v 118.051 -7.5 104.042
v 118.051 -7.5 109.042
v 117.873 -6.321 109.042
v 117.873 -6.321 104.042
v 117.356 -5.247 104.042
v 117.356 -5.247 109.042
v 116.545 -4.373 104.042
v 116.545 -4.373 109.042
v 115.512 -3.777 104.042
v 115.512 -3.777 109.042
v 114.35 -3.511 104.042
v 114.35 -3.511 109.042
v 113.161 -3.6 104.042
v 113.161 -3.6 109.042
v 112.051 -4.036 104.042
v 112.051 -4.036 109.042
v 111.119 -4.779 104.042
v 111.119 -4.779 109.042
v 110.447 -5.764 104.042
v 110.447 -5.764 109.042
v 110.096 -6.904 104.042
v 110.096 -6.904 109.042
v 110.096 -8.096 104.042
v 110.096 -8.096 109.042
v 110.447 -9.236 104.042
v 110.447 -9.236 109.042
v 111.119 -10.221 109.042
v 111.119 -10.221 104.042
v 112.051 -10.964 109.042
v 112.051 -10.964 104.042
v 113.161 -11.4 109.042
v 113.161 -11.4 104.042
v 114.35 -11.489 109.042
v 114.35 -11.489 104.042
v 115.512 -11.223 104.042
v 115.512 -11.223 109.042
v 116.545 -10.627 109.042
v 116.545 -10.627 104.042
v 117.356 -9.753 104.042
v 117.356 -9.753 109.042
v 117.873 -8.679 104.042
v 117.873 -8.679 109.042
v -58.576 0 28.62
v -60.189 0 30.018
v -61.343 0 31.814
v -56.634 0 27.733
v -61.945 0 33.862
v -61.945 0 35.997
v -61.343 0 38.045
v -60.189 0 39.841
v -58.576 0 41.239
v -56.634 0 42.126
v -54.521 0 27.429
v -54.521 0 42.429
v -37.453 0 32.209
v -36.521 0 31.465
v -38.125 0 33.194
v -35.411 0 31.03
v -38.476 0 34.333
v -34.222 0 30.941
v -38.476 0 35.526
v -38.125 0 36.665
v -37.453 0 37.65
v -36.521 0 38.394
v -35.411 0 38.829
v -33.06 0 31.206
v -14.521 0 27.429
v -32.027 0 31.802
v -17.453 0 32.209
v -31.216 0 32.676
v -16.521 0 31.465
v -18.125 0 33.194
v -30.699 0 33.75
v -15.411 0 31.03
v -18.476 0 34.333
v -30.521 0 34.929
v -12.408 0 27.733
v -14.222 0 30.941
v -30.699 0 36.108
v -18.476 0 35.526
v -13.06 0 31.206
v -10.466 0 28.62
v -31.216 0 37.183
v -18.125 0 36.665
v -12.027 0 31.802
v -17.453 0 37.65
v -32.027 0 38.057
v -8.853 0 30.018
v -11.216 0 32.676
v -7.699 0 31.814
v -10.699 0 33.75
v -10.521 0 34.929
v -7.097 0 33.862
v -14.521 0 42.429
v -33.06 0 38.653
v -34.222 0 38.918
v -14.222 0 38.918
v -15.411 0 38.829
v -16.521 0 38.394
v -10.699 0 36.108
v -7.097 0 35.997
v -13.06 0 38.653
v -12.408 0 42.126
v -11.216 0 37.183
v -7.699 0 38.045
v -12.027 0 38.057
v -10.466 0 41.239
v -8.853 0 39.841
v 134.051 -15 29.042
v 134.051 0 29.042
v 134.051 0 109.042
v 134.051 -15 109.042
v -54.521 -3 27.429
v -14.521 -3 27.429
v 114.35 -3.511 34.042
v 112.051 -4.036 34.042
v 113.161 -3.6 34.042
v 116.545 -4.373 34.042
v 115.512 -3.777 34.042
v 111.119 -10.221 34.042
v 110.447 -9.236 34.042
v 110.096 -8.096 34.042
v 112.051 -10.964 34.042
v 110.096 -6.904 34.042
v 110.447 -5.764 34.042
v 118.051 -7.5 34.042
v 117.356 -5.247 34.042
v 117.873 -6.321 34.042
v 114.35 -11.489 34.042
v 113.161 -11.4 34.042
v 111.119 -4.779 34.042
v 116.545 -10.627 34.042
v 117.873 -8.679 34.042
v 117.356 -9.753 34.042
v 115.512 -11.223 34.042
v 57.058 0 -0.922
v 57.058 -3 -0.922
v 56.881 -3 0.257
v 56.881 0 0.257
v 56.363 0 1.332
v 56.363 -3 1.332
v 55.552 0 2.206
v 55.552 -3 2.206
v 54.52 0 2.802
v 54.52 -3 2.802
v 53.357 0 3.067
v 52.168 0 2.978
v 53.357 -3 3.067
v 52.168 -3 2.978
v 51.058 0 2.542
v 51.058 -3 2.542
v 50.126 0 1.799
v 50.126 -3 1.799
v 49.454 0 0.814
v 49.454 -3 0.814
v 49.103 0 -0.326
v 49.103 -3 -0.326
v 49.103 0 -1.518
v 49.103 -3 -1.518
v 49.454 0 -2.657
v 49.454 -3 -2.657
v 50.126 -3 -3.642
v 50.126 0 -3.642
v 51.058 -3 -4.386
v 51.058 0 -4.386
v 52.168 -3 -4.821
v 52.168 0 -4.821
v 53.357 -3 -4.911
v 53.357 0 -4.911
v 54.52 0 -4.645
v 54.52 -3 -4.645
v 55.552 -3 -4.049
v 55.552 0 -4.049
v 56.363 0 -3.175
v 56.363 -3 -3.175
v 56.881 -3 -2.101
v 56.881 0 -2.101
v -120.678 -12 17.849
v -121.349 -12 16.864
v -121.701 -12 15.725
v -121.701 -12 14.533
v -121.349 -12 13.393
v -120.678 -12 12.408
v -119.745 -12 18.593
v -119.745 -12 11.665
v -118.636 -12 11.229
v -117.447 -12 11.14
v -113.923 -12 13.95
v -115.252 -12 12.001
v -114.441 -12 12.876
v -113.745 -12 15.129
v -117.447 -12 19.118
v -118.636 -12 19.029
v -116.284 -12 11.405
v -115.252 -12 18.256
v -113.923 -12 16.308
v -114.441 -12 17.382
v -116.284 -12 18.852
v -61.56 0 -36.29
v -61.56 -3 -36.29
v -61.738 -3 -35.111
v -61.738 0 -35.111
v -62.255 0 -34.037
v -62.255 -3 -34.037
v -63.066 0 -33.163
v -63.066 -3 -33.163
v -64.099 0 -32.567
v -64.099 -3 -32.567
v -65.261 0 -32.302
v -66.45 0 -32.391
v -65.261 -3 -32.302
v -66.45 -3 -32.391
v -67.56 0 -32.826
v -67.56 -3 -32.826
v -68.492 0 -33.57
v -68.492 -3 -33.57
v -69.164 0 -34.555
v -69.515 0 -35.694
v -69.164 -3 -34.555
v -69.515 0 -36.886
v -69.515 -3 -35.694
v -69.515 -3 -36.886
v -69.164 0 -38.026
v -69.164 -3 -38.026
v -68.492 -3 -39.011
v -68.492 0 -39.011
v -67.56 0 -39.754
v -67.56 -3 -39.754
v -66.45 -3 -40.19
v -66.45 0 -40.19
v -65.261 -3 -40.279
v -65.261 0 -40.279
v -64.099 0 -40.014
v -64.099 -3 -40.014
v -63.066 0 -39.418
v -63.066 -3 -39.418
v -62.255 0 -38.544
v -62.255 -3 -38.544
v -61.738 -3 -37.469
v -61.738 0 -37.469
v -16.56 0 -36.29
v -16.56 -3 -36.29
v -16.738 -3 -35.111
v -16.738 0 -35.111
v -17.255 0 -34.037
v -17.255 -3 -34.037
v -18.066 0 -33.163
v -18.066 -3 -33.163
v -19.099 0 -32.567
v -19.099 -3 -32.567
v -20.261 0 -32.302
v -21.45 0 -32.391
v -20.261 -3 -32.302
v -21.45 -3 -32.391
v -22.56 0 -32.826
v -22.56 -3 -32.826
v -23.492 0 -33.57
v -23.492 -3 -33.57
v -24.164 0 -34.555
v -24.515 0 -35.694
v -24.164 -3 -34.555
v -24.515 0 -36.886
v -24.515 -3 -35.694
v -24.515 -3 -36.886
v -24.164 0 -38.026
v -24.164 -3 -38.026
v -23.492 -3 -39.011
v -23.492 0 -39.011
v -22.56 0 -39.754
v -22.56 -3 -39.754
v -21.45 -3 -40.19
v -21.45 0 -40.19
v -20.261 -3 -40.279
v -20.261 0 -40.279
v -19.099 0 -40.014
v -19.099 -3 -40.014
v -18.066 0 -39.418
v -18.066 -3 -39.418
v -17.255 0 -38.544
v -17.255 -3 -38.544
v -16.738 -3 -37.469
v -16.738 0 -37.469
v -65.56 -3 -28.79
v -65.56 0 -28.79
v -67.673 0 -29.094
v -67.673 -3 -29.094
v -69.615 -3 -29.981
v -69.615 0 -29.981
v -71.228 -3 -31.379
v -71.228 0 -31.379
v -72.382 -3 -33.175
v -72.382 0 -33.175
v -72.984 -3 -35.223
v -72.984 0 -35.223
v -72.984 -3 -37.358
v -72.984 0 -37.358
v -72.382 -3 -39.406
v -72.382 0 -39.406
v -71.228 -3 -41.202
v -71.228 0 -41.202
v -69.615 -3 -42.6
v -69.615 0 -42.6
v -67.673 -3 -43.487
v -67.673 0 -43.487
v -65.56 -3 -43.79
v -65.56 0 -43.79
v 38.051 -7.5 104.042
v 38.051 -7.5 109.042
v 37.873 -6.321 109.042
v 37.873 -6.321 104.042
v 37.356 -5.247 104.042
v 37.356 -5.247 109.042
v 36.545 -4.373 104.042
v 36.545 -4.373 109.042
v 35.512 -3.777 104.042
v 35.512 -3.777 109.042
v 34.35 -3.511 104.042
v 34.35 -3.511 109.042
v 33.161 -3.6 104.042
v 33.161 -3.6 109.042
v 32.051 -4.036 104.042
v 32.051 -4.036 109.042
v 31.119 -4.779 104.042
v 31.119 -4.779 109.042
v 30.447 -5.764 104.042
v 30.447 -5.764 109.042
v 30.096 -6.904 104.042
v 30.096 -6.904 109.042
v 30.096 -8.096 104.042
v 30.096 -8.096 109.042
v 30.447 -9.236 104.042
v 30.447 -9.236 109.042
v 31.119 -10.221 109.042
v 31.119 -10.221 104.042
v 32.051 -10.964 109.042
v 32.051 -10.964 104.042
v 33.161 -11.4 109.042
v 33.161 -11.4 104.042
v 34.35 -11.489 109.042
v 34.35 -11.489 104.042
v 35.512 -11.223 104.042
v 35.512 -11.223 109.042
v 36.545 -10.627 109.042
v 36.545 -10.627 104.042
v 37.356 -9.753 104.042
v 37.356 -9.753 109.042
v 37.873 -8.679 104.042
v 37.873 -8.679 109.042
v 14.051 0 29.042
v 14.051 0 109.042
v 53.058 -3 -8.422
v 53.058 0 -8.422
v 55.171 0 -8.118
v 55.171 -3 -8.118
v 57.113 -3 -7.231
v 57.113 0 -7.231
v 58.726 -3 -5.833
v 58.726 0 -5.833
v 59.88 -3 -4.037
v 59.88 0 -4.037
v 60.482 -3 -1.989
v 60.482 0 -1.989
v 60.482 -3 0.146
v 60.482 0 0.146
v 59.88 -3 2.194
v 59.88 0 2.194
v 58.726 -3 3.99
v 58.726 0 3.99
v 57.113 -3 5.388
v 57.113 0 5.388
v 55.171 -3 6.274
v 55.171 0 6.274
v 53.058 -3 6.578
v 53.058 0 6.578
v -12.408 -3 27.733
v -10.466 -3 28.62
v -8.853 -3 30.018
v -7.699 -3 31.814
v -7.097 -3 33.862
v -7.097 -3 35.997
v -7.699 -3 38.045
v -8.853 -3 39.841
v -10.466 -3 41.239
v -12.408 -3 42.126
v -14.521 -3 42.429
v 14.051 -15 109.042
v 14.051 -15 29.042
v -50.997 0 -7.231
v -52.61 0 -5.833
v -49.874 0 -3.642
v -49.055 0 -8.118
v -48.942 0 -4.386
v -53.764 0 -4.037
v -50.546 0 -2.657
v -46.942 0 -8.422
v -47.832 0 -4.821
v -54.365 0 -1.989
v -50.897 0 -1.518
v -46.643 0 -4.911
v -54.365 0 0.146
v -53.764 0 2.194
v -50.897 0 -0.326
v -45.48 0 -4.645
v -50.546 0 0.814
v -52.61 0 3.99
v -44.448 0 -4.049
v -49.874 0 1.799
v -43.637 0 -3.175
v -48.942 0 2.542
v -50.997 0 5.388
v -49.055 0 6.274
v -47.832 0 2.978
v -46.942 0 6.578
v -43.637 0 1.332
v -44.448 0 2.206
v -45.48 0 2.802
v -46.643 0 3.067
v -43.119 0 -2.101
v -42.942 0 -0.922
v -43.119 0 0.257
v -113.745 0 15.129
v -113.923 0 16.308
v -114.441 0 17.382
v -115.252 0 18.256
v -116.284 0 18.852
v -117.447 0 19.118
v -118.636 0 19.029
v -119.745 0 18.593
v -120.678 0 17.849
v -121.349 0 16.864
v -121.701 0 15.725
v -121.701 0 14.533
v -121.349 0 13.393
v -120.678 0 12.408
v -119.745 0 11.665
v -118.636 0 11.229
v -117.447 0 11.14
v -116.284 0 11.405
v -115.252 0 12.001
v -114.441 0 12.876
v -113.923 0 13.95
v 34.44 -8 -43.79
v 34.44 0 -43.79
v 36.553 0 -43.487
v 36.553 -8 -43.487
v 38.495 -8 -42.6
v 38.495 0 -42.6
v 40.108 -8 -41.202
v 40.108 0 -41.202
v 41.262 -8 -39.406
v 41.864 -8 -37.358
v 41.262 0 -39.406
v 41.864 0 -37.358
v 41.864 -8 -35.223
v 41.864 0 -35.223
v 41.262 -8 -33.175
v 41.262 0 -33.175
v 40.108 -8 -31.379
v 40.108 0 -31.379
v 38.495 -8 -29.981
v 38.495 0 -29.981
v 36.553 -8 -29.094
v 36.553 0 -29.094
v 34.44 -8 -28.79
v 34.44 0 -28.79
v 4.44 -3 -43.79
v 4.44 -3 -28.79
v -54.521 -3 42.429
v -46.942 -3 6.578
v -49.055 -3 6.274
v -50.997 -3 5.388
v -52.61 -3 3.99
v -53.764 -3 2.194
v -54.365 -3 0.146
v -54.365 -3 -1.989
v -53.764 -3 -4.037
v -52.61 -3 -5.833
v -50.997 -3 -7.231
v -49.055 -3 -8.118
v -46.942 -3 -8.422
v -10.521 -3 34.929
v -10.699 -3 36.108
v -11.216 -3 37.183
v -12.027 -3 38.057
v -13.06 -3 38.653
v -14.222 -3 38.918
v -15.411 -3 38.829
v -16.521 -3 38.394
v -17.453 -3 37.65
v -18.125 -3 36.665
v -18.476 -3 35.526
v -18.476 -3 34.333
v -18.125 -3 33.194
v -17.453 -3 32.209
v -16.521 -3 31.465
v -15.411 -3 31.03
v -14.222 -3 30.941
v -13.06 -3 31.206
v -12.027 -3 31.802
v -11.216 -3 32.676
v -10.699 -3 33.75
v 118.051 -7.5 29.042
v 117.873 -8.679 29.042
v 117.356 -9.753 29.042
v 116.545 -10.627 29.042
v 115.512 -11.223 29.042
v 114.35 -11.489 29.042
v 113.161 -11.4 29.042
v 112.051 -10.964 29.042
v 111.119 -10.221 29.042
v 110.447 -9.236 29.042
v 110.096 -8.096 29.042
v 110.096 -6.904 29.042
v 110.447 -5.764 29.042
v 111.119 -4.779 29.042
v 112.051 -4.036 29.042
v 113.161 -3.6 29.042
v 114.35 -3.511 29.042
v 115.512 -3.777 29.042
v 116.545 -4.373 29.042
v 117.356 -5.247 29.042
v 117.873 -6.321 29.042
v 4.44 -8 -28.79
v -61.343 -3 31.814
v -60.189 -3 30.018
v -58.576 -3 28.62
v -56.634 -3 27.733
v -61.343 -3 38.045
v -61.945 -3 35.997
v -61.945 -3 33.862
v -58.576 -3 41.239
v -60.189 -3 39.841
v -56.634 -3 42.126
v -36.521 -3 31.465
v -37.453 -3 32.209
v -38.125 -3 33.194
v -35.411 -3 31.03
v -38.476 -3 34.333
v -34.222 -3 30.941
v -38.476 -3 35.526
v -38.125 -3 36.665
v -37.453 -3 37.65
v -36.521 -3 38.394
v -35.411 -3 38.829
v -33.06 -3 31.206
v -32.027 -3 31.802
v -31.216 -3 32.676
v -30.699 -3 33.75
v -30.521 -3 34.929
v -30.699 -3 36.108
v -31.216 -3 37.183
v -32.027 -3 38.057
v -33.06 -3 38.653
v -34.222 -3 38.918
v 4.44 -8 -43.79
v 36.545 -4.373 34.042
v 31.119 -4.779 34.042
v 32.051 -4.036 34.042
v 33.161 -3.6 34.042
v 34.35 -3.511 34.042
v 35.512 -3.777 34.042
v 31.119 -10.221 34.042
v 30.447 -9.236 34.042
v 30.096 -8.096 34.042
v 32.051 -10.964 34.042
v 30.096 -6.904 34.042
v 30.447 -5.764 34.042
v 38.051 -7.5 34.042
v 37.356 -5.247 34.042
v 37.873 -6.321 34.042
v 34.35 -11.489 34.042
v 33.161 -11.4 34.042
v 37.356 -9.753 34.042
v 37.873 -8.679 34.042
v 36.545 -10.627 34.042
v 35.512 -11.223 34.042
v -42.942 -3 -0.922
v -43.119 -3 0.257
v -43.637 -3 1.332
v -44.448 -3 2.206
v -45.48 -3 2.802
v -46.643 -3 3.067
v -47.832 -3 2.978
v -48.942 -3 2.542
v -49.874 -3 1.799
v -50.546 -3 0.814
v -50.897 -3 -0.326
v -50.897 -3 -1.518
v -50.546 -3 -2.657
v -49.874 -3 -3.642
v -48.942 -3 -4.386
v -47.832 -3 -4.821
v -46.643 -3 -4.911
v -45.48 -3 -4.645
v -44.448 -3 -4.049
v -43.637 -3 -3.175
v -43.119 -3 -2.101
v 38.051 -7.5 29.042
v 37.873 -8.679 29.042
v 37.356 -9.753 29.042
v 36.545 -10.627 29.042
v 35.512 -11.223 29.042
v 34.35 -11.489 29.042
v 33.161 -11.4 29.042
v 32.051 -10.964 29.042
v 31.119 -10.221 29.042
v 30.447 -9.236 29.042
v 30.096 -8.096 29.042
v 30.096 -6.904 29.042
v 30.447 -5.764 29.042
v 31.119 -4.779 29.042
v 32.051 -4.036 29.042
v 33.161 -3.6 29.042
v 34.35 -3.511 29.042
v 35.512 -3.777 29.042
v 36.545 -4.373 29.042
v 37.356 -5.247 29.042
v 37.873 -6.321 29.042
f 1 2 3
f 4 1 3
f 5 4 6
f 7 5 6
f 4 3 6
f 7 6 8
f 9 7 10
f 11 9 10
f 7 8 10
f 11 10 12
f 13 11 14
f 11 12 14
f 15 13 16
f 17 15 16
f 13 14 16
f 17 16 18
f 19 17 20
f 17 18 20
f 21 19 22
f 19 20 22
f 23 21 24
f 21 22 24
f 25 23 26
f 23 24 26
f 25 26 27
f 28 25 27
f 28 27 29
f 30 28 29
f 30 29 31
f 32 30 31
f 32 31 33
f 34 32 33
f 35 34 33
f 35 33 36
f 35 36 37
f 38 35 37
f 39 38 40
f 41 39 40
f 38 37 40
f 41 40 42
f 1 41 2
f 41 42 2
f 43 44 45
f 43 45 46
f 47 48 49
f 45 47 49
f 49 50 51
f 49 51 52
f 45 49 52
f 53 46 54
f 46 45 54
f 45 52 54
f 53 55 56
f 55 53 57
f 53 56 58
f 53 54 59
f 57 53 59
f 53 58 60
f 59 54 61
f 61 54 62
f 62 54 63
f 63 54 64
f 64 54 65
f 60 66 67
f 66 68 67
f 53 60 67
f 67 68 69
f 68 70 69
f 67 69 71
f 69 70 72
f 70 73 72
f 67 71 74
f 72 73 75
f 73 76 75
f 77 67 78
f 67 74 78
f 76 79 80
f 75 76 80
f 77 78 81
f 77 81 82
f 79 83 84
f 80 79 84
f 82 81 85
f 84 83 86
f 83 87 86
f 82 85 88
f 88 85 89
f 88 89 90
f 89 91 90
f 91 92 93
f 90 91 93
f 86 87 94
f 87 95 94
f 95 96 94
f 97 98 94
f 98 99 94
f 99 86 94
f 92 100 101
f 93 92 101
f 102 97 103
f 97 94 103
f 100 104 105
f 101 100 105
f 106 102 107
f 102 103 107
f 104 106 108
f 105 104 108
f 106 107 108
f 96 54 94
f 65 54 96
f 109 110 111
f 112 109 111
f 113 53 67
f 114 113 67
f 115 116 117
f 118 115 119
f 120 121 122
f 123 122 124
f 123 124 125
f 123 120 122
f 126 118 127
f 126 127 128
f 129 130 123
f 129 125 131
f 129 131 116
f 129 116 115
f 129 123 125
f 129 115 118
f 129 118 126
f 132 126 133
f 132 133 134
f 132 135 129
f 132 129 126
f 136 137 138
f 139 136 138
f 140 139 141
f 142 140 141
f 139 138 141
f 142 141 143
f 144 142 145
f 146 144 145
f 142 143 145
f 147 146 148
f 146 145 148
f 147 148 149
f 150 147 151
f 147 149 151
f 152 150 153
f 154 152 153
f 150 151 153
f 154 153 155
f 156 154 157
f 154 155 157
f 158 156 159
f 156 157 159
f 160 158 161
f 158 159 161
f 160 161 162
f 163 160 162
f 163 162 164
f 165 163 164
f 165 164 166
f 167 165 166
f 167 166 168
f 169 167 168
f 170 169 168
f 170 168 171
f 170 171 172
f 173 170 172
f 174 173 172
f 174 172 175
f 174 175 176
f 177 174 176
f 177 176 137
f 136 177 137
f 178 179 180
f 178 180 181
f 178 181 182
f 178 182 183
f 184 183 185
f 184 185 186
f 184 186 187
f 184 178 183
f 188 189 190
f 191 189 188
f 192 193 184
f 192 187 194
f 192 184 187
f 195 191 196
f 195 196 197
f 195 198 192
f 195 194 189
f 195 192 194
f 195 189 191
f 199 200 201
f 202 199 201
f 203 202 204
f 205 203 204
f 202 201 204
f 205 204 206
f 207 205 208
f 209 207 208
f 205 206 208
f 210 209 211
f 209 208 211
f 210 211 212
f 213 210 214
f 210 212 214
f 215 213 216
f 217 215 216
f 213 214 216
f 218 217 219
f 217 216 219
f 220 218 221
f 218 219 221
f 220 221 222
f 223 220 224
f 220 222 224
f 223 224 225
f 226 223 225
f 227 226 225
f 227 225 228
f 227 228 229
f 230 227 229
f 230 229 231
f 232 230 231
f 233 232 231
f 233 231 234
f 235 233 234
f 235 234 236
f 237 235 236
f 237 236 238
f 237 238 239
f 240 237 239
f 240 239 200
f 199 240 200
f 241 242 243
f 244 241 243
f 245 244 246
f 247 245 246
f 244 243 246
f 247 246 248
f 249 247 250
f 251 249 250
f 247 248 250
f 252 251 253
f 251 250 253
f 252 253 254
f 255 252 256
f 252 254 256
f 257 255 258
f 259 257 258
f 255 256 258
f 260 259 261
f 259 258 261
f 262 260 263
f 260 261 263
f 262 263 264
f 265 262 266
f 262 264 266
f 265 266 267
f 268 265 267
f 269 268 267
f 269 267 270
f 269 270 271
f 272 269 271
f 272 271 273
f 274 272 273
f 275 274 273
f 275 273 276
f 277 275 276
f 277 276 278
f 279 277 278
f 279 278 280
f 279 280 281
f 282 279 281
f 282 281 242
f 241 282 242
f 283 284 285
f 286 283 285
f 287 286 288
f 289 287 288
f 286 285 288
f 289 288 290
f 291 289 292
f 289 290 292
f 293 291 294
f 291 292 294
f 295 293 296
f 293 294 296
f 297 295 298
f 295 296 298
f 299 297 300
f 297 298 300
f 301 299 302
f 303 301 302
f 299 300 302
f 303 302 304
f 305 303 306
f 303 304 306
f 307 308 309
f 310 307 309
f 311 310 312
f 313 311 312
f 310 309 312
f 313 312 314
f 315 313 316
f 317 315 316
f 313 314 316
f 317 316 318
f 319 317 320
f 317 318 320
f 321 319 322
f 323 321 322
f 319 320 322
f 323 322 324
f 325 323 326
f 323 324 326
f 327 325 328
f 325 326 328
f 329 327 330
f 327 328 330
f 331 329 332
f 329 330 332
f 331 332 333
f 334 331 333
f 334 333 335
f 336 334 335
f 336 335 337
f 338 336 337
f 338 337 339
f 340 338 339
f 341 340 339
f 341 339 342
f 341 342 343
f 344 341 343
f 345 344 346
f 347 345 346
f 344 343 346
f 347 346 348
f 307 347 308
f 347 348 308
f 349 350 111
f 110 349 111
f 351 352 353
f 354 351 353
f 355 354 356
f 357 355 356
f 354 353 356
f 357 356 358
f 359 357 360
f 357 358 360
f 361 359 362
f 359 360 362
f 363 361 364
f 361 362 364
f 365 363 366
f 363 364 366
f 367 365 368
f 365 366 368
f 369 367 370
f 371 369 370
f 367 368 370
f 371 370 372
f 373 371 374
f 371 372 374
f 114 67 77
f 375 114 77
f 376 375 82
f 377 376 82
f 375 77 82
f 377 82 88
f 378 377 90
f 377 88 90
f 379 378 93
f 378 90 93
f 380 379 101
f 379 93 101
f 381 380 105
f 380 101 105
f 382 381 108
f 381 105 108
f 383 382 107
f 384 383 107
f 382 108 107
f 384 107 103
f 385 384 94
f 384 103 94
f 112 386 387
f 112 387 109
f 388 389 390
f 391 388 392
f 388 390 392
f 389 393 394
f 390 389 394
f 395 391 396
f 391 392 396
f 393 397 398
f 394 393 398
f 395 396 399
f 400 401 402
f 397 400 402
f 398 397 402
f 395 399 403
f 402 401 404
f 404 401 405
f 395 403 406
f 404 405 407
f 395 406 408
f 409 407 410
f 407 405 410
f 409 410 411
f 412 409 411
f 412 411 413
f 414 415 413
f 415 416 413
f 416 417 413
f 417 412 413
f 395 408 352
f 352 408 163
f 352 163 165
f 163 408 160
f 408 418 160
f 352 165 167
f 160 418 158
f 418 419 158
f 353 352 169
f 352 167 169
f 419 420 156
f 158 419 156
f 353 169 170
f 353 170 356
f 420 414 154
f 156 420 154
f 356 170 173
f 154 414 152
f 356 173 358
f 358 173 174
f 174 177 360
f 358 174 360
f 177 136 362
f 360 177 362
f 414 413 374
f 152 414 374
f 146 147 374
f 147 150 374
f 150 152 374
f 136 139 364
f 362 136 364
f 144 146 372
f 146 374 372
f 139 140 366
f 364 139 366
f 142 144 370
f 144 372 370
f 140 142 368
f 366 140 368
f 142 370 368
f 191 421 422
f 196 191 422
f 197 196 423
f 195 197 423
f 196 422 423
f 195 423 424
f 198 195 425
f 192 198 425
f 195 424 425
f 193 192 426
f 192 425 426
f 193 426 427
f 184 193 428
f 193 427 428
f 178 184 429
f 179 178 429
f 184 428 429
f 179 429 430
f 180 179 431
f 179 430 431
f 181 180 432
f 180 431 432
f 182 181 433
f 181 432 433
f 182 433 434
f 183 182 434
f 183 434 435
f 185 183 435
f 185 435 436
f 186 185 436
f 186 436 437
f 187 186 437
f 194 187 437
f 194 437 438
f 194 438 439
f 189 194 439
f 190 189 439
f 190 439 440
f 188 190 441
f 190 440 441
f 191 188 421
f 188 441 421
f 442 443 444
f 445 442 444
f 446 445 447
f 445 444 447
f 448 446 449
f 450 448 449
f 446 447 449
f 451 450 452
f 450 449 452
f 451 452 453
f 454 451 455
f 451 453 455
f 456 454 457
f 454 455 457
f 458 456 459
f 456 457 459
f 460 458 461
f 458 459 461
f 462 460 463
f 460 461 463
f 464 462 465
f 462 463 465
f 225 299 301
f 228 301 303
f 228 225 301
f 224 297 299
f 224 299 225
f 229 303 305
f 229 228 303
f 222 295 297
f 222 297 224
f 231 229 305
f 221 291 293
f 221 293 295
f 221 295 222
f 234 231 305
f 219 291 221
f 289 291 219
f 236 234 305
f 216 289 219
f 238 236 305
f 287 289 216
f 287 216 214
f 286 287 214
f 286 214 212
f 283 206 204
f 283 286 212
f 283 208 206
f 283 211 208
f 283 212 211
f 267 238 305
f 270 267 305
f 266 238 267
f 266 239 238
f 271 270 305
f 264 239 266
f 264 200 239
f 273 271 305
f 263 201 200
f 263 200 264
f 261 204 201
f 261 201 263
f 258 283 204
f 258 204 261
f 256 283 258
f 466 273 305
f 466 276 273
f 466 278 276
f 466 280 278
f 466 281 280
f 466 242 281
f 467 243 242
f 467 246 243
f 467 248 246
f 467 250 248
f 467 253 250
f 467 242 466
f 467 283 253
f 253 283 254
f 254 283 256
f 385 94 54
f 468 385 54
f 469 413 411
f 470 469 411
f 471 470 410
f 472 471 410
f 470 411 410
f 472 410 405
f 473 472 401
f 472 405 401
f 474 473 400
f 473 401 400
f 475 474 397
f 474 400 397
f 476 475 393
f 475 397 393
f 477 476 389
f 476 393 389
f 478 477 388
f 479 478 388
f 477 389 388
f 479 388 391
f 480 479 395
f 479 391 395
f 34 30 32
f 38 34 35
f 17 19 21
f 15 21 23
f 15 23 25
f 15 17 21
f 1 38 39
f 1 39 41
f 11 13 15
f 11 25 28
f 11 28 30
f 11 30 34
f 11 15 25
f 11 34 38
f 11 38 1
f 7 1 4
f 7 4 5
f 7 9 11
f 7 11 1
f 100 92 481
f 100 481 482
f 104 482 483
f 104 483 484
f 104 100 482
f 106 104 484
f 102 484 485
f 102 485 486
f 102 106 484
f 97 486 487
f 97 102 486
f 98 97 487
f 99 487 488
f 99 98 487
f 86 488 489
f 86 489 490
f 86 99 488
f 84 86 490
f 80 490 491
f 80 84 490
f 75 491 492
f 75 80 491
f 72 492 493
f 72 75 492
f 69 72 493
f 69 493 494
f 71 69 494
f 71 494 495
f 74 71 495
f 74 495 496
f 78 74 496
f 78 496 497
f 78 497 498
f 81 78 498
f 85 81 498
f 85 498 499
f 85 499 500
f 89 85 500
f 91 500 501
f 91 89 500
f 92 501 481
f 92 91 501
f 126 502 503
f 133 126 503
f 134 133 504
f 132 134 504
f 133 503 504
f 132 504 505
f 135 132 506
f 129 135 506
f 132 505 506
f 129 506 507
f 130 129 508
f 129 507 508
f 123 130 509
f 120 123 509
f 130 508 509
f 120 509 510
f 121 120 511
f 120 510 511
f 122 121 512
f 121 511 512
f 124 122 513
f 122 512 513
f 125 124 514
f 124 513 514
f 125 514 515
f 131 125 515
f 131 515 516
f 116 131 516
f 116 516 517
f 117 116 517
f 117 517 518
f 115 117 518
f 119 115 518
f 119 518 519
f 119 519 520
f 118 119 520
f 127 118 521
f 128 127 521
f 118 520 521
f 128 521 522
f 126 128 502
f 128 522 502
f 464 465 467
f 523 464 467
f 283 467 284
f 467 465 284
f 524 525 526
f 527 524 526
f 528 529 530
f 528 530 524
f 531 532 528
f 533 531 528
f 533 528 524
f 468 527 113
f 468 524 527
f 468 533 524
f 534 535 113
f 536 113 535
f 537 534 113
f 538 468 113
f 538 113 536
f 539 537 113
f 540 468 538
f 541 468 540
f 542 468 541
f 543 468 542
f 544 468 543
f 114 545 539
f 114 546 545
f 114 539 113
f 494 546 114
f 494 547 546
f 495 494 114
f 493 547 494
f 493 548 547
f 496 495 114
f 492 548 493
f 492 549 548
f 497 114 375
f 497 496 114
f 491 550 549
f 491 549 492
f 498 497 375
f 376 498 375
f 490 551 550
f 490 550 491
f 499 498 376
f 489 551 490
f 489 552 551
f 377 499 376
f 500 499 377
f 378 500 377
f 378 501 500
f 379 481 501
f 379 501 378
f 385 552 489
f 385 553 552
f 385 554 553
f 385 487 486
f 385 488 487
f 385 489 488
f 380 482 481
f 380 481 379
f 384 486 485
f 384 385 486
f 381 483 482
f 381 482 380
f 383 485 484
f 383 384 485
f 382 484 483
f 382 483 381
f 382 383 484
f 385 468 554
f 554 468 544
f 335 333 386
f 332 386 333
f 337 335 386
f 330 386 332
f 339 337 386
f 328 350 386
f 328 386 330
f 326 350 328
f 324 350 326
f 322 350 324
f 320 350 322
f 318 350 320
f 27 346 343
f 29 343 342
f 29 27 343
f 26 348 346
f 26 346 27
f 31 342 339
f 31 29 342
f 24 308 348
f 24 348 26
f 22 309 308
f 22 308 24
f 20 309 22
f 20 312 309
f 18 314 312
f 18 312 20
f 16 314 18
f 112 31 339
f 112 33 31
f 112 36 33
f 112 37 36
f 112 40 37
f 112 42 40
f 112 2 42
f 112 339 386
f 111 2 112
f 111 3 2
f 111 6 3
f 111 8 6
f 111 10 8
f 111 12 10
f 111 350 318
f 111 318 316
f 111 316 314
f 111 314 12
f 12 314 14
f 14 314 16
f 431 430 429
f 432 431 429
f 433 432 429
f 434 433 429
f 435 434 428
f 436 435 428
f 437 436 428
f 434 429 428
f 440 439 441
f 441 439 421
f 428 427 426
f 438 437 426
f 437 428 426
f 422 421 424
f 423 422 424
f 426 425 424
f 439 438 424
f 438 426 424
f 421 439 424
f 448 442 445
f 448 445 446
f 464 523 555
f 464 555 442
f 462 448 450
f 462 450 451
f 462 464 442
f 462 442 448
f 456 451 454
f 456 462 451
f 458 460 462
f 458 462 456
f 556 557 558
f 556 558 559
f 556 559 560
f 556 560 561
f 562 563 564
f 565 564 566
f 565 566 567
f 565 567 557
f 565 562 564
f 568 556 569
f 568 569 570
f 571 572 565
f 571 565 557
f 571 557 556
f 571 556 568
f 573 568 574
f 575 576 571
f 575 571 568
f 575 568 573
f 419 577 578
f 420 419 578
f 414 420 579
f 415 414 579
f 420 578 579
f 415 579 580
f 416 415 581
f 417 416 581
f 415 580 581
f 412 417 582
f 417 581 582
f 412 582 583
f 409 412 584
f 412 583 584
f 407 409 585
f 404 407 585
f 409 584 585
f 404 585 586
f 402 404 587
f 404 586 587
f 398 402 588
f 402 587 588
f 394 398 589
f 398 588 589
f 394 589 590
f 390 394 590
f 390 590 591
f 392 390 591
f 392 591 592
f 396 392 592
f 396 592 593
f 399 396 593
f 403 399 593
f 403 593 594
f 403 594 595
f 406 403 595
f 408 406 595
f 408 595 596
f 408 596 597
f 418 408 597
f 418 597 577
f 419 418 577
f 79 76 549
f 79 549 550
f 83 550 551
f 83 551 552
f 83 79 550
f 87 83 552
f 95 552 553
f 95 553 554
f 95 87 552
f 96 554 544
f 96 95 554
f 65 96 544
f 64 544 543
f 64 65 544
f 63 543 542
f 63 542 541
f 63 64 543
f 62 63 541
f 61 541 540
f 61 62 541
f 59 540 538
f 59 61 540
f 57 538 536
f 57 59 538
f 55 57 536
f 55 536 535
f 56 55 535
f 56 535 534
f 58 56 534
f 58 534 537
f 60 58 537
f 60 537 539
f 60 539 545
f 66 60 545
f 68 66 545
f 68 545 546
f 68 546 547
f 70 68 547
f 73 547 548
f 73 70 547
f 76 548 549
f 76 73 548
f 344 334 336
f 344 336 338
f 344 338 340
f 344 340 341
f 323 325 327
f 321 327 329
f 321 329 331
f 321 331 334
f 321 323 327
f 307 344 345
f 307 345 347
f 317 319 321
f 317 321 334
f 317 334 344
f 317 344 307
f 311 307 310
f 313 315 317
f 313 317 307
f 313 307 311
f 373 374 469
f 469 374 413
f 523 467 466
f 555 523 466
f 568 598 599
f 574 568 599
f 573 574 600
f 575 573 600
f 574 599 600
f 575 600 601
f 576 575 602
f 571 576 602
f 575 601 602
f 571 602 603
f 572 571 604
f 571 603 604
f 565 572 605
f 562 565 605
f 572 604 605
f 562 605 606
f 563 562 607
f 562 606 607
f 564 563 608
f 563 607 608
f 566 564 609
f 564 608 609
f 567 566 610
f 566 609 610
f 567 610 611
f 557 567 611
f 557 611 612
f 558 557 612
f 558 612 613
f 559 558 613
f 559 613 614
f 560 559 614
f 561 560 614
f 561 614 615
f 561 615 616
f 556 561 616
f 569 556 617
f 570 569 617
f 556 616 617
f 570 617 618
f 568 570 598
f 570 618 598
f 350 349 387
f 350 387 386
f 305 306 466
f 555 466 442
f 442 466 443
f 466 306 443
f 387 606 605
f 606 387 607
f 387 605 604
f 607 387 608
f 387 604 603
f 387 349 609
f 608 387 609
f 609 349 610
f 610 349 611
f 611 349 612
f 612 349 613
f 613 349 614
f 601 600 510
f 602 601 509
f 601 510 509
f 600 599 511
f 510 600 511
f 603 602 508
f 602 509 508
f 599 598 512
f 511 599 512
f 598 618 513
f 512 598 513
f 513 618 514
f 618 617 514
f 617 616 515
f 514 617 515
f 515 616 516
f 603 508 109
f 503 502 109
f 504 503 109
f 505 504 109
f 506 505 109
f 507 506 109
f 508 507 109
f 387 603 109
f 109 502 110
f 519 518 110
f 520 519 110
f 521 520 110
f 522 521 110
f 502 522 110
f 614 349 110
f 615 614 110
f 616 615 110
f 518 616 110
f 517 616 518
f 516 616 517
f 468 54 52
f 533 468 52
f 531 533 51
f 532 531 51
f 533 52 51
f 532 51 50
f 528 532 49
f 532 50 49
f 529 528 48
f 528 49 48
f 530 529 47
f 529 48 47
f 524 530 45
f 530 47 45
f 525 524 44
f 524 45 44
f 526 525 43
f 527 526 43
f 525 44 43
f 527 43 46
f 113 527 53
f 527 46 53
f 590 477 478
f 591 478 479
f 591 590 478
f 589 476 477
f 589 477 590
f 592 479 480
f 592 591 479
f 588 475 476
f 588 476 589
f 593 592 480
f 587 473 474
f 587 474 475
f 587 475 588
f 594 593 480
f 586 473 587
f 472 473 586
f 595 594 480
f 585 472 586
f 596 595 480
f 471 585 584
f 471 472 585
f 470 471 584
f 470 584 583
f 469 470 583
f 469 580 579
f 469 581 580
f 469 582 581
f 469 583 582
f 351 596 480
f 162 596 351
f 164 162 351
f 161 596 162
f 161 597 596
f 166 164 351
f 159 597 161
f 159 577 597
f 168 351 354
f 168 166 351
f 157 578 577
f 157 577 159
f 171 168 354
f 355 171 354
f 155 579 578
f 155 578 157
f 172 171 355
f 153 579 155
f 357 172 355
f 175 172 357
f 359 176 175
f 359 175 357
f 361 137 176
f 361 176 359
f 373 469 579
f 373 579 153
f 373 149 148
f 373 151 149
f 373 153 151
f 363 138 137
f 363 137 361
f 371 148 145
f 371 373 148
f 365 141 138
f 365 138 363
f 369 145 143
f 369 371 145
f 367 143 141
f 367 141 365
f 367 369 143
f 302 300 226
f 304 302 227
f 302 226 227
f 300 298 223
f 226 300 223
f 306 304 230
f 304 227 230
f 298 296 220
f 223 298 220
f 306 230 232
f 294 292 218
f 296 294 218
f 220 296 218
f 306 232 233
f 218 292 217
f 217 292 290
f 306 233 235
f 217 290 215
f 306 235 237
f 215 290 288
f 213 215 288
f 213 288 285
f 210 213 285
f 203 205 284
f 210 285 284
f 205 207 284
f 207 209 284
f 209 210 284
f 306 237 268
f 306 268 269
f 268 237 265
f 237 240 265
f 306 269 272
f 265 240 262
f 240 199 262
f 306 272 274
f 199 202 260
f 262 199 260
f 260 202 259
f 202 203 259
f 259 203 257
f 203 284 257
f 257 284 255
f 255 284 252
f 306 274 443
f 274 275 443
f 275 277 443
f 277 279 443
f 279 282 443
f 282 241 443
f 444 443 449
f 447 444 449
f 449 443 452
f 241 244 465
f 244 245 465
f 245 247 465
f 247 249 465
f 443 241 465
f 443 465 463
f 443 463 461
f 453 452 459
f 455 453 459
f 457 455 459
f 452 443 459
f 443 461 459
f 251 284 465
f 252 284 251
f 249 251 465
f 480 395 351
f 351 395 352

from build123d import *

# Parameters (mm, degrees)
F1_DEPTH  = 3
F3_DEPTH  = 3
F5_DEPTH  = 5
F6_R      = 4
F7_DEPTH  = 25
F8_R      = 4
F9_DEPTH  = 25
F10_R     = 4
F11_DEPTH = 3
F12_W     = 120
F12_H     = 80
F13_DEPTH = 15
F14_R     = 4
F15_DEPTH = 5
F16_R     = 4
F17_DEPTH = 5
F18_R     = 4
F19_DEPTH = 12


with BuildPart() as f1:
    # F0 (on Front) → F1 (new body)
    with BuildSketch(Plane.XZ):
        with BuildLine():
            Line((53.058239, 6.578226), (-46.941761, 6.578226))
            ThreePointArc((-46.941761, 6.578226), (-54.441761, -0.921774), (-46.941761, -8.421774))
            Line((-46.941761, -8.421774), (53.058239, -8.421774))
            ThreePointArc((53.058239, -8.421774), (60.558239, -0.921774), (53.058239, 6.578226))
        make_face()
    extrude(amount=F1_DEPTH)

    # F6 (on face) → F7 (cut)
    with BuildSketch(Plane.XZ.offset(3)):
        with Locations((53.058239, -0.921774)):
            Circle(F6_R)
        with Locations((-46.941761, -0.921774)):
            Circle(F6_R)
    extrude(amount=-F7_DEPTH, mode=Mode.SUBTRACT)


with BuildPart() as f3:
    # F2 (on Front) → F3 (new body)
    with BuildSketch(Plane.XZ):
        with BuildLine():
            Line((34.439946, -28.790323), (-65.560054, -28.790323))
            ThreePointArc((-65.560054, -28.790323), (-73.060054, -36.290323), (-65.560054, -43.790323))
            Line((-65.560054, -43.790323), (34.439946, -43.790323))
            ThreePointArc((34.439946, -43.790323), (41.939946, -36.290323), (34.439946, -28.790323))
        make_face()
    extrude(amount=F3_DEPTH)

    # F4 (on face) → F5 (join)
    with BuildSketch(Plane.XZ.offset(3)):
        with BuildLine():
            Line((34.439946, -28.790323), (4.439946, -28.790323))
            Line((4.439946, -28.790323), (4.439946, -43.790323))
            Line((4.439946, -43.790323), (34.439946, -43.790323))
            ThreePointArc((34.439946, -43.790323), (41.939946, -36.290323), (34.439946, -28.790323))
        make_face()
    extrude(amount=F5_DEPTH)

    # F8 (on face) → F9 (cut)
    with BuildSketch(Plane.XZ.offset(8)):
        with Locations((-65.560054, -36.290323)):
            Circle(F8_R)
        with Locations((-20.560054, -36.290323)):
            Circle(F8_R)
    extrude(amount=-F9_DEPTH, mode=Mode.SUBTRACT)


with BuildPart() as f11:
    # F10 (on Front) → F11 (new body)
    with BuildSketch(Plane.XZ):
        with BuildLine():
            Line((-14.520992, 42.429436), (-54.520992, 42.429436))
            ThreePointArc((-54.520992, 42.429436), (-62.020992, 34.929436), (-54.520992, 27.429436))
            Line((-54.520992, 27.429436), (-14.520992, 27.429436))
            ThreePointArc((-14.520992, 27.429436), (-7.020992, 34.929436), (-14.520992, 42.429436))
        make_face()
        with Locations((-34.520992, 34.929436)):
            Circle(F10_R, mode=Mode.SUBTRACT)
        with Locations((-14.520992, 34.929436)):
            Circle(F10_R, mode=Mode.SUBTRACT)
    extrude(amount=F11_DEPTH)


with BuildPart() as f13:
    # F12 (on Front) → F13 (new body)
    with BuildSketch(Plane.XZ):
        with Locations((74.050978, 69.042339)):
            Rectangle(F12_W, F12_H)
    extrude(amount=F13_DEPTH)

    # F14 (on face) → F15 (cut)
    with BuildSketch(Plane(origin=(0, 0, 29.042339), x_dir=(1, 0, 0), z_dir=(0, 0, -1))):
        with Locations((34.050978, 7.5)):
            Circle(F14_R)
        with Locations((114.050978, 7.5)):
            Circle(F14_R)
    extrude(amount=-F15_DEPTH, mode=Mode.SUBTRACT)

    # F16 (on face) → F17 (cut)
    with BuildSketch(Plane.XY.offset(109.042339)):
        with Locations((34.050978, -7.5)):
            Circle(F16_R)
        with Locations((114.050978, -7.5)):
            Circle(F16_R)
    extrude(amount=-F17_DEPTH, mode=Mode.SUBTRACT)


with BuildPart() as f19:
    # F18 (on Front) → F19 (new body)
    with BuildSketch(Plane.XZ):
        with Locations((-117.745496, 15.128797)):
            Circle(F18_R)
    extrude(amount=F19_DEPTH)


solid = Compound([f1.part, f3.part, f11.part, f13.part, f19.part])
